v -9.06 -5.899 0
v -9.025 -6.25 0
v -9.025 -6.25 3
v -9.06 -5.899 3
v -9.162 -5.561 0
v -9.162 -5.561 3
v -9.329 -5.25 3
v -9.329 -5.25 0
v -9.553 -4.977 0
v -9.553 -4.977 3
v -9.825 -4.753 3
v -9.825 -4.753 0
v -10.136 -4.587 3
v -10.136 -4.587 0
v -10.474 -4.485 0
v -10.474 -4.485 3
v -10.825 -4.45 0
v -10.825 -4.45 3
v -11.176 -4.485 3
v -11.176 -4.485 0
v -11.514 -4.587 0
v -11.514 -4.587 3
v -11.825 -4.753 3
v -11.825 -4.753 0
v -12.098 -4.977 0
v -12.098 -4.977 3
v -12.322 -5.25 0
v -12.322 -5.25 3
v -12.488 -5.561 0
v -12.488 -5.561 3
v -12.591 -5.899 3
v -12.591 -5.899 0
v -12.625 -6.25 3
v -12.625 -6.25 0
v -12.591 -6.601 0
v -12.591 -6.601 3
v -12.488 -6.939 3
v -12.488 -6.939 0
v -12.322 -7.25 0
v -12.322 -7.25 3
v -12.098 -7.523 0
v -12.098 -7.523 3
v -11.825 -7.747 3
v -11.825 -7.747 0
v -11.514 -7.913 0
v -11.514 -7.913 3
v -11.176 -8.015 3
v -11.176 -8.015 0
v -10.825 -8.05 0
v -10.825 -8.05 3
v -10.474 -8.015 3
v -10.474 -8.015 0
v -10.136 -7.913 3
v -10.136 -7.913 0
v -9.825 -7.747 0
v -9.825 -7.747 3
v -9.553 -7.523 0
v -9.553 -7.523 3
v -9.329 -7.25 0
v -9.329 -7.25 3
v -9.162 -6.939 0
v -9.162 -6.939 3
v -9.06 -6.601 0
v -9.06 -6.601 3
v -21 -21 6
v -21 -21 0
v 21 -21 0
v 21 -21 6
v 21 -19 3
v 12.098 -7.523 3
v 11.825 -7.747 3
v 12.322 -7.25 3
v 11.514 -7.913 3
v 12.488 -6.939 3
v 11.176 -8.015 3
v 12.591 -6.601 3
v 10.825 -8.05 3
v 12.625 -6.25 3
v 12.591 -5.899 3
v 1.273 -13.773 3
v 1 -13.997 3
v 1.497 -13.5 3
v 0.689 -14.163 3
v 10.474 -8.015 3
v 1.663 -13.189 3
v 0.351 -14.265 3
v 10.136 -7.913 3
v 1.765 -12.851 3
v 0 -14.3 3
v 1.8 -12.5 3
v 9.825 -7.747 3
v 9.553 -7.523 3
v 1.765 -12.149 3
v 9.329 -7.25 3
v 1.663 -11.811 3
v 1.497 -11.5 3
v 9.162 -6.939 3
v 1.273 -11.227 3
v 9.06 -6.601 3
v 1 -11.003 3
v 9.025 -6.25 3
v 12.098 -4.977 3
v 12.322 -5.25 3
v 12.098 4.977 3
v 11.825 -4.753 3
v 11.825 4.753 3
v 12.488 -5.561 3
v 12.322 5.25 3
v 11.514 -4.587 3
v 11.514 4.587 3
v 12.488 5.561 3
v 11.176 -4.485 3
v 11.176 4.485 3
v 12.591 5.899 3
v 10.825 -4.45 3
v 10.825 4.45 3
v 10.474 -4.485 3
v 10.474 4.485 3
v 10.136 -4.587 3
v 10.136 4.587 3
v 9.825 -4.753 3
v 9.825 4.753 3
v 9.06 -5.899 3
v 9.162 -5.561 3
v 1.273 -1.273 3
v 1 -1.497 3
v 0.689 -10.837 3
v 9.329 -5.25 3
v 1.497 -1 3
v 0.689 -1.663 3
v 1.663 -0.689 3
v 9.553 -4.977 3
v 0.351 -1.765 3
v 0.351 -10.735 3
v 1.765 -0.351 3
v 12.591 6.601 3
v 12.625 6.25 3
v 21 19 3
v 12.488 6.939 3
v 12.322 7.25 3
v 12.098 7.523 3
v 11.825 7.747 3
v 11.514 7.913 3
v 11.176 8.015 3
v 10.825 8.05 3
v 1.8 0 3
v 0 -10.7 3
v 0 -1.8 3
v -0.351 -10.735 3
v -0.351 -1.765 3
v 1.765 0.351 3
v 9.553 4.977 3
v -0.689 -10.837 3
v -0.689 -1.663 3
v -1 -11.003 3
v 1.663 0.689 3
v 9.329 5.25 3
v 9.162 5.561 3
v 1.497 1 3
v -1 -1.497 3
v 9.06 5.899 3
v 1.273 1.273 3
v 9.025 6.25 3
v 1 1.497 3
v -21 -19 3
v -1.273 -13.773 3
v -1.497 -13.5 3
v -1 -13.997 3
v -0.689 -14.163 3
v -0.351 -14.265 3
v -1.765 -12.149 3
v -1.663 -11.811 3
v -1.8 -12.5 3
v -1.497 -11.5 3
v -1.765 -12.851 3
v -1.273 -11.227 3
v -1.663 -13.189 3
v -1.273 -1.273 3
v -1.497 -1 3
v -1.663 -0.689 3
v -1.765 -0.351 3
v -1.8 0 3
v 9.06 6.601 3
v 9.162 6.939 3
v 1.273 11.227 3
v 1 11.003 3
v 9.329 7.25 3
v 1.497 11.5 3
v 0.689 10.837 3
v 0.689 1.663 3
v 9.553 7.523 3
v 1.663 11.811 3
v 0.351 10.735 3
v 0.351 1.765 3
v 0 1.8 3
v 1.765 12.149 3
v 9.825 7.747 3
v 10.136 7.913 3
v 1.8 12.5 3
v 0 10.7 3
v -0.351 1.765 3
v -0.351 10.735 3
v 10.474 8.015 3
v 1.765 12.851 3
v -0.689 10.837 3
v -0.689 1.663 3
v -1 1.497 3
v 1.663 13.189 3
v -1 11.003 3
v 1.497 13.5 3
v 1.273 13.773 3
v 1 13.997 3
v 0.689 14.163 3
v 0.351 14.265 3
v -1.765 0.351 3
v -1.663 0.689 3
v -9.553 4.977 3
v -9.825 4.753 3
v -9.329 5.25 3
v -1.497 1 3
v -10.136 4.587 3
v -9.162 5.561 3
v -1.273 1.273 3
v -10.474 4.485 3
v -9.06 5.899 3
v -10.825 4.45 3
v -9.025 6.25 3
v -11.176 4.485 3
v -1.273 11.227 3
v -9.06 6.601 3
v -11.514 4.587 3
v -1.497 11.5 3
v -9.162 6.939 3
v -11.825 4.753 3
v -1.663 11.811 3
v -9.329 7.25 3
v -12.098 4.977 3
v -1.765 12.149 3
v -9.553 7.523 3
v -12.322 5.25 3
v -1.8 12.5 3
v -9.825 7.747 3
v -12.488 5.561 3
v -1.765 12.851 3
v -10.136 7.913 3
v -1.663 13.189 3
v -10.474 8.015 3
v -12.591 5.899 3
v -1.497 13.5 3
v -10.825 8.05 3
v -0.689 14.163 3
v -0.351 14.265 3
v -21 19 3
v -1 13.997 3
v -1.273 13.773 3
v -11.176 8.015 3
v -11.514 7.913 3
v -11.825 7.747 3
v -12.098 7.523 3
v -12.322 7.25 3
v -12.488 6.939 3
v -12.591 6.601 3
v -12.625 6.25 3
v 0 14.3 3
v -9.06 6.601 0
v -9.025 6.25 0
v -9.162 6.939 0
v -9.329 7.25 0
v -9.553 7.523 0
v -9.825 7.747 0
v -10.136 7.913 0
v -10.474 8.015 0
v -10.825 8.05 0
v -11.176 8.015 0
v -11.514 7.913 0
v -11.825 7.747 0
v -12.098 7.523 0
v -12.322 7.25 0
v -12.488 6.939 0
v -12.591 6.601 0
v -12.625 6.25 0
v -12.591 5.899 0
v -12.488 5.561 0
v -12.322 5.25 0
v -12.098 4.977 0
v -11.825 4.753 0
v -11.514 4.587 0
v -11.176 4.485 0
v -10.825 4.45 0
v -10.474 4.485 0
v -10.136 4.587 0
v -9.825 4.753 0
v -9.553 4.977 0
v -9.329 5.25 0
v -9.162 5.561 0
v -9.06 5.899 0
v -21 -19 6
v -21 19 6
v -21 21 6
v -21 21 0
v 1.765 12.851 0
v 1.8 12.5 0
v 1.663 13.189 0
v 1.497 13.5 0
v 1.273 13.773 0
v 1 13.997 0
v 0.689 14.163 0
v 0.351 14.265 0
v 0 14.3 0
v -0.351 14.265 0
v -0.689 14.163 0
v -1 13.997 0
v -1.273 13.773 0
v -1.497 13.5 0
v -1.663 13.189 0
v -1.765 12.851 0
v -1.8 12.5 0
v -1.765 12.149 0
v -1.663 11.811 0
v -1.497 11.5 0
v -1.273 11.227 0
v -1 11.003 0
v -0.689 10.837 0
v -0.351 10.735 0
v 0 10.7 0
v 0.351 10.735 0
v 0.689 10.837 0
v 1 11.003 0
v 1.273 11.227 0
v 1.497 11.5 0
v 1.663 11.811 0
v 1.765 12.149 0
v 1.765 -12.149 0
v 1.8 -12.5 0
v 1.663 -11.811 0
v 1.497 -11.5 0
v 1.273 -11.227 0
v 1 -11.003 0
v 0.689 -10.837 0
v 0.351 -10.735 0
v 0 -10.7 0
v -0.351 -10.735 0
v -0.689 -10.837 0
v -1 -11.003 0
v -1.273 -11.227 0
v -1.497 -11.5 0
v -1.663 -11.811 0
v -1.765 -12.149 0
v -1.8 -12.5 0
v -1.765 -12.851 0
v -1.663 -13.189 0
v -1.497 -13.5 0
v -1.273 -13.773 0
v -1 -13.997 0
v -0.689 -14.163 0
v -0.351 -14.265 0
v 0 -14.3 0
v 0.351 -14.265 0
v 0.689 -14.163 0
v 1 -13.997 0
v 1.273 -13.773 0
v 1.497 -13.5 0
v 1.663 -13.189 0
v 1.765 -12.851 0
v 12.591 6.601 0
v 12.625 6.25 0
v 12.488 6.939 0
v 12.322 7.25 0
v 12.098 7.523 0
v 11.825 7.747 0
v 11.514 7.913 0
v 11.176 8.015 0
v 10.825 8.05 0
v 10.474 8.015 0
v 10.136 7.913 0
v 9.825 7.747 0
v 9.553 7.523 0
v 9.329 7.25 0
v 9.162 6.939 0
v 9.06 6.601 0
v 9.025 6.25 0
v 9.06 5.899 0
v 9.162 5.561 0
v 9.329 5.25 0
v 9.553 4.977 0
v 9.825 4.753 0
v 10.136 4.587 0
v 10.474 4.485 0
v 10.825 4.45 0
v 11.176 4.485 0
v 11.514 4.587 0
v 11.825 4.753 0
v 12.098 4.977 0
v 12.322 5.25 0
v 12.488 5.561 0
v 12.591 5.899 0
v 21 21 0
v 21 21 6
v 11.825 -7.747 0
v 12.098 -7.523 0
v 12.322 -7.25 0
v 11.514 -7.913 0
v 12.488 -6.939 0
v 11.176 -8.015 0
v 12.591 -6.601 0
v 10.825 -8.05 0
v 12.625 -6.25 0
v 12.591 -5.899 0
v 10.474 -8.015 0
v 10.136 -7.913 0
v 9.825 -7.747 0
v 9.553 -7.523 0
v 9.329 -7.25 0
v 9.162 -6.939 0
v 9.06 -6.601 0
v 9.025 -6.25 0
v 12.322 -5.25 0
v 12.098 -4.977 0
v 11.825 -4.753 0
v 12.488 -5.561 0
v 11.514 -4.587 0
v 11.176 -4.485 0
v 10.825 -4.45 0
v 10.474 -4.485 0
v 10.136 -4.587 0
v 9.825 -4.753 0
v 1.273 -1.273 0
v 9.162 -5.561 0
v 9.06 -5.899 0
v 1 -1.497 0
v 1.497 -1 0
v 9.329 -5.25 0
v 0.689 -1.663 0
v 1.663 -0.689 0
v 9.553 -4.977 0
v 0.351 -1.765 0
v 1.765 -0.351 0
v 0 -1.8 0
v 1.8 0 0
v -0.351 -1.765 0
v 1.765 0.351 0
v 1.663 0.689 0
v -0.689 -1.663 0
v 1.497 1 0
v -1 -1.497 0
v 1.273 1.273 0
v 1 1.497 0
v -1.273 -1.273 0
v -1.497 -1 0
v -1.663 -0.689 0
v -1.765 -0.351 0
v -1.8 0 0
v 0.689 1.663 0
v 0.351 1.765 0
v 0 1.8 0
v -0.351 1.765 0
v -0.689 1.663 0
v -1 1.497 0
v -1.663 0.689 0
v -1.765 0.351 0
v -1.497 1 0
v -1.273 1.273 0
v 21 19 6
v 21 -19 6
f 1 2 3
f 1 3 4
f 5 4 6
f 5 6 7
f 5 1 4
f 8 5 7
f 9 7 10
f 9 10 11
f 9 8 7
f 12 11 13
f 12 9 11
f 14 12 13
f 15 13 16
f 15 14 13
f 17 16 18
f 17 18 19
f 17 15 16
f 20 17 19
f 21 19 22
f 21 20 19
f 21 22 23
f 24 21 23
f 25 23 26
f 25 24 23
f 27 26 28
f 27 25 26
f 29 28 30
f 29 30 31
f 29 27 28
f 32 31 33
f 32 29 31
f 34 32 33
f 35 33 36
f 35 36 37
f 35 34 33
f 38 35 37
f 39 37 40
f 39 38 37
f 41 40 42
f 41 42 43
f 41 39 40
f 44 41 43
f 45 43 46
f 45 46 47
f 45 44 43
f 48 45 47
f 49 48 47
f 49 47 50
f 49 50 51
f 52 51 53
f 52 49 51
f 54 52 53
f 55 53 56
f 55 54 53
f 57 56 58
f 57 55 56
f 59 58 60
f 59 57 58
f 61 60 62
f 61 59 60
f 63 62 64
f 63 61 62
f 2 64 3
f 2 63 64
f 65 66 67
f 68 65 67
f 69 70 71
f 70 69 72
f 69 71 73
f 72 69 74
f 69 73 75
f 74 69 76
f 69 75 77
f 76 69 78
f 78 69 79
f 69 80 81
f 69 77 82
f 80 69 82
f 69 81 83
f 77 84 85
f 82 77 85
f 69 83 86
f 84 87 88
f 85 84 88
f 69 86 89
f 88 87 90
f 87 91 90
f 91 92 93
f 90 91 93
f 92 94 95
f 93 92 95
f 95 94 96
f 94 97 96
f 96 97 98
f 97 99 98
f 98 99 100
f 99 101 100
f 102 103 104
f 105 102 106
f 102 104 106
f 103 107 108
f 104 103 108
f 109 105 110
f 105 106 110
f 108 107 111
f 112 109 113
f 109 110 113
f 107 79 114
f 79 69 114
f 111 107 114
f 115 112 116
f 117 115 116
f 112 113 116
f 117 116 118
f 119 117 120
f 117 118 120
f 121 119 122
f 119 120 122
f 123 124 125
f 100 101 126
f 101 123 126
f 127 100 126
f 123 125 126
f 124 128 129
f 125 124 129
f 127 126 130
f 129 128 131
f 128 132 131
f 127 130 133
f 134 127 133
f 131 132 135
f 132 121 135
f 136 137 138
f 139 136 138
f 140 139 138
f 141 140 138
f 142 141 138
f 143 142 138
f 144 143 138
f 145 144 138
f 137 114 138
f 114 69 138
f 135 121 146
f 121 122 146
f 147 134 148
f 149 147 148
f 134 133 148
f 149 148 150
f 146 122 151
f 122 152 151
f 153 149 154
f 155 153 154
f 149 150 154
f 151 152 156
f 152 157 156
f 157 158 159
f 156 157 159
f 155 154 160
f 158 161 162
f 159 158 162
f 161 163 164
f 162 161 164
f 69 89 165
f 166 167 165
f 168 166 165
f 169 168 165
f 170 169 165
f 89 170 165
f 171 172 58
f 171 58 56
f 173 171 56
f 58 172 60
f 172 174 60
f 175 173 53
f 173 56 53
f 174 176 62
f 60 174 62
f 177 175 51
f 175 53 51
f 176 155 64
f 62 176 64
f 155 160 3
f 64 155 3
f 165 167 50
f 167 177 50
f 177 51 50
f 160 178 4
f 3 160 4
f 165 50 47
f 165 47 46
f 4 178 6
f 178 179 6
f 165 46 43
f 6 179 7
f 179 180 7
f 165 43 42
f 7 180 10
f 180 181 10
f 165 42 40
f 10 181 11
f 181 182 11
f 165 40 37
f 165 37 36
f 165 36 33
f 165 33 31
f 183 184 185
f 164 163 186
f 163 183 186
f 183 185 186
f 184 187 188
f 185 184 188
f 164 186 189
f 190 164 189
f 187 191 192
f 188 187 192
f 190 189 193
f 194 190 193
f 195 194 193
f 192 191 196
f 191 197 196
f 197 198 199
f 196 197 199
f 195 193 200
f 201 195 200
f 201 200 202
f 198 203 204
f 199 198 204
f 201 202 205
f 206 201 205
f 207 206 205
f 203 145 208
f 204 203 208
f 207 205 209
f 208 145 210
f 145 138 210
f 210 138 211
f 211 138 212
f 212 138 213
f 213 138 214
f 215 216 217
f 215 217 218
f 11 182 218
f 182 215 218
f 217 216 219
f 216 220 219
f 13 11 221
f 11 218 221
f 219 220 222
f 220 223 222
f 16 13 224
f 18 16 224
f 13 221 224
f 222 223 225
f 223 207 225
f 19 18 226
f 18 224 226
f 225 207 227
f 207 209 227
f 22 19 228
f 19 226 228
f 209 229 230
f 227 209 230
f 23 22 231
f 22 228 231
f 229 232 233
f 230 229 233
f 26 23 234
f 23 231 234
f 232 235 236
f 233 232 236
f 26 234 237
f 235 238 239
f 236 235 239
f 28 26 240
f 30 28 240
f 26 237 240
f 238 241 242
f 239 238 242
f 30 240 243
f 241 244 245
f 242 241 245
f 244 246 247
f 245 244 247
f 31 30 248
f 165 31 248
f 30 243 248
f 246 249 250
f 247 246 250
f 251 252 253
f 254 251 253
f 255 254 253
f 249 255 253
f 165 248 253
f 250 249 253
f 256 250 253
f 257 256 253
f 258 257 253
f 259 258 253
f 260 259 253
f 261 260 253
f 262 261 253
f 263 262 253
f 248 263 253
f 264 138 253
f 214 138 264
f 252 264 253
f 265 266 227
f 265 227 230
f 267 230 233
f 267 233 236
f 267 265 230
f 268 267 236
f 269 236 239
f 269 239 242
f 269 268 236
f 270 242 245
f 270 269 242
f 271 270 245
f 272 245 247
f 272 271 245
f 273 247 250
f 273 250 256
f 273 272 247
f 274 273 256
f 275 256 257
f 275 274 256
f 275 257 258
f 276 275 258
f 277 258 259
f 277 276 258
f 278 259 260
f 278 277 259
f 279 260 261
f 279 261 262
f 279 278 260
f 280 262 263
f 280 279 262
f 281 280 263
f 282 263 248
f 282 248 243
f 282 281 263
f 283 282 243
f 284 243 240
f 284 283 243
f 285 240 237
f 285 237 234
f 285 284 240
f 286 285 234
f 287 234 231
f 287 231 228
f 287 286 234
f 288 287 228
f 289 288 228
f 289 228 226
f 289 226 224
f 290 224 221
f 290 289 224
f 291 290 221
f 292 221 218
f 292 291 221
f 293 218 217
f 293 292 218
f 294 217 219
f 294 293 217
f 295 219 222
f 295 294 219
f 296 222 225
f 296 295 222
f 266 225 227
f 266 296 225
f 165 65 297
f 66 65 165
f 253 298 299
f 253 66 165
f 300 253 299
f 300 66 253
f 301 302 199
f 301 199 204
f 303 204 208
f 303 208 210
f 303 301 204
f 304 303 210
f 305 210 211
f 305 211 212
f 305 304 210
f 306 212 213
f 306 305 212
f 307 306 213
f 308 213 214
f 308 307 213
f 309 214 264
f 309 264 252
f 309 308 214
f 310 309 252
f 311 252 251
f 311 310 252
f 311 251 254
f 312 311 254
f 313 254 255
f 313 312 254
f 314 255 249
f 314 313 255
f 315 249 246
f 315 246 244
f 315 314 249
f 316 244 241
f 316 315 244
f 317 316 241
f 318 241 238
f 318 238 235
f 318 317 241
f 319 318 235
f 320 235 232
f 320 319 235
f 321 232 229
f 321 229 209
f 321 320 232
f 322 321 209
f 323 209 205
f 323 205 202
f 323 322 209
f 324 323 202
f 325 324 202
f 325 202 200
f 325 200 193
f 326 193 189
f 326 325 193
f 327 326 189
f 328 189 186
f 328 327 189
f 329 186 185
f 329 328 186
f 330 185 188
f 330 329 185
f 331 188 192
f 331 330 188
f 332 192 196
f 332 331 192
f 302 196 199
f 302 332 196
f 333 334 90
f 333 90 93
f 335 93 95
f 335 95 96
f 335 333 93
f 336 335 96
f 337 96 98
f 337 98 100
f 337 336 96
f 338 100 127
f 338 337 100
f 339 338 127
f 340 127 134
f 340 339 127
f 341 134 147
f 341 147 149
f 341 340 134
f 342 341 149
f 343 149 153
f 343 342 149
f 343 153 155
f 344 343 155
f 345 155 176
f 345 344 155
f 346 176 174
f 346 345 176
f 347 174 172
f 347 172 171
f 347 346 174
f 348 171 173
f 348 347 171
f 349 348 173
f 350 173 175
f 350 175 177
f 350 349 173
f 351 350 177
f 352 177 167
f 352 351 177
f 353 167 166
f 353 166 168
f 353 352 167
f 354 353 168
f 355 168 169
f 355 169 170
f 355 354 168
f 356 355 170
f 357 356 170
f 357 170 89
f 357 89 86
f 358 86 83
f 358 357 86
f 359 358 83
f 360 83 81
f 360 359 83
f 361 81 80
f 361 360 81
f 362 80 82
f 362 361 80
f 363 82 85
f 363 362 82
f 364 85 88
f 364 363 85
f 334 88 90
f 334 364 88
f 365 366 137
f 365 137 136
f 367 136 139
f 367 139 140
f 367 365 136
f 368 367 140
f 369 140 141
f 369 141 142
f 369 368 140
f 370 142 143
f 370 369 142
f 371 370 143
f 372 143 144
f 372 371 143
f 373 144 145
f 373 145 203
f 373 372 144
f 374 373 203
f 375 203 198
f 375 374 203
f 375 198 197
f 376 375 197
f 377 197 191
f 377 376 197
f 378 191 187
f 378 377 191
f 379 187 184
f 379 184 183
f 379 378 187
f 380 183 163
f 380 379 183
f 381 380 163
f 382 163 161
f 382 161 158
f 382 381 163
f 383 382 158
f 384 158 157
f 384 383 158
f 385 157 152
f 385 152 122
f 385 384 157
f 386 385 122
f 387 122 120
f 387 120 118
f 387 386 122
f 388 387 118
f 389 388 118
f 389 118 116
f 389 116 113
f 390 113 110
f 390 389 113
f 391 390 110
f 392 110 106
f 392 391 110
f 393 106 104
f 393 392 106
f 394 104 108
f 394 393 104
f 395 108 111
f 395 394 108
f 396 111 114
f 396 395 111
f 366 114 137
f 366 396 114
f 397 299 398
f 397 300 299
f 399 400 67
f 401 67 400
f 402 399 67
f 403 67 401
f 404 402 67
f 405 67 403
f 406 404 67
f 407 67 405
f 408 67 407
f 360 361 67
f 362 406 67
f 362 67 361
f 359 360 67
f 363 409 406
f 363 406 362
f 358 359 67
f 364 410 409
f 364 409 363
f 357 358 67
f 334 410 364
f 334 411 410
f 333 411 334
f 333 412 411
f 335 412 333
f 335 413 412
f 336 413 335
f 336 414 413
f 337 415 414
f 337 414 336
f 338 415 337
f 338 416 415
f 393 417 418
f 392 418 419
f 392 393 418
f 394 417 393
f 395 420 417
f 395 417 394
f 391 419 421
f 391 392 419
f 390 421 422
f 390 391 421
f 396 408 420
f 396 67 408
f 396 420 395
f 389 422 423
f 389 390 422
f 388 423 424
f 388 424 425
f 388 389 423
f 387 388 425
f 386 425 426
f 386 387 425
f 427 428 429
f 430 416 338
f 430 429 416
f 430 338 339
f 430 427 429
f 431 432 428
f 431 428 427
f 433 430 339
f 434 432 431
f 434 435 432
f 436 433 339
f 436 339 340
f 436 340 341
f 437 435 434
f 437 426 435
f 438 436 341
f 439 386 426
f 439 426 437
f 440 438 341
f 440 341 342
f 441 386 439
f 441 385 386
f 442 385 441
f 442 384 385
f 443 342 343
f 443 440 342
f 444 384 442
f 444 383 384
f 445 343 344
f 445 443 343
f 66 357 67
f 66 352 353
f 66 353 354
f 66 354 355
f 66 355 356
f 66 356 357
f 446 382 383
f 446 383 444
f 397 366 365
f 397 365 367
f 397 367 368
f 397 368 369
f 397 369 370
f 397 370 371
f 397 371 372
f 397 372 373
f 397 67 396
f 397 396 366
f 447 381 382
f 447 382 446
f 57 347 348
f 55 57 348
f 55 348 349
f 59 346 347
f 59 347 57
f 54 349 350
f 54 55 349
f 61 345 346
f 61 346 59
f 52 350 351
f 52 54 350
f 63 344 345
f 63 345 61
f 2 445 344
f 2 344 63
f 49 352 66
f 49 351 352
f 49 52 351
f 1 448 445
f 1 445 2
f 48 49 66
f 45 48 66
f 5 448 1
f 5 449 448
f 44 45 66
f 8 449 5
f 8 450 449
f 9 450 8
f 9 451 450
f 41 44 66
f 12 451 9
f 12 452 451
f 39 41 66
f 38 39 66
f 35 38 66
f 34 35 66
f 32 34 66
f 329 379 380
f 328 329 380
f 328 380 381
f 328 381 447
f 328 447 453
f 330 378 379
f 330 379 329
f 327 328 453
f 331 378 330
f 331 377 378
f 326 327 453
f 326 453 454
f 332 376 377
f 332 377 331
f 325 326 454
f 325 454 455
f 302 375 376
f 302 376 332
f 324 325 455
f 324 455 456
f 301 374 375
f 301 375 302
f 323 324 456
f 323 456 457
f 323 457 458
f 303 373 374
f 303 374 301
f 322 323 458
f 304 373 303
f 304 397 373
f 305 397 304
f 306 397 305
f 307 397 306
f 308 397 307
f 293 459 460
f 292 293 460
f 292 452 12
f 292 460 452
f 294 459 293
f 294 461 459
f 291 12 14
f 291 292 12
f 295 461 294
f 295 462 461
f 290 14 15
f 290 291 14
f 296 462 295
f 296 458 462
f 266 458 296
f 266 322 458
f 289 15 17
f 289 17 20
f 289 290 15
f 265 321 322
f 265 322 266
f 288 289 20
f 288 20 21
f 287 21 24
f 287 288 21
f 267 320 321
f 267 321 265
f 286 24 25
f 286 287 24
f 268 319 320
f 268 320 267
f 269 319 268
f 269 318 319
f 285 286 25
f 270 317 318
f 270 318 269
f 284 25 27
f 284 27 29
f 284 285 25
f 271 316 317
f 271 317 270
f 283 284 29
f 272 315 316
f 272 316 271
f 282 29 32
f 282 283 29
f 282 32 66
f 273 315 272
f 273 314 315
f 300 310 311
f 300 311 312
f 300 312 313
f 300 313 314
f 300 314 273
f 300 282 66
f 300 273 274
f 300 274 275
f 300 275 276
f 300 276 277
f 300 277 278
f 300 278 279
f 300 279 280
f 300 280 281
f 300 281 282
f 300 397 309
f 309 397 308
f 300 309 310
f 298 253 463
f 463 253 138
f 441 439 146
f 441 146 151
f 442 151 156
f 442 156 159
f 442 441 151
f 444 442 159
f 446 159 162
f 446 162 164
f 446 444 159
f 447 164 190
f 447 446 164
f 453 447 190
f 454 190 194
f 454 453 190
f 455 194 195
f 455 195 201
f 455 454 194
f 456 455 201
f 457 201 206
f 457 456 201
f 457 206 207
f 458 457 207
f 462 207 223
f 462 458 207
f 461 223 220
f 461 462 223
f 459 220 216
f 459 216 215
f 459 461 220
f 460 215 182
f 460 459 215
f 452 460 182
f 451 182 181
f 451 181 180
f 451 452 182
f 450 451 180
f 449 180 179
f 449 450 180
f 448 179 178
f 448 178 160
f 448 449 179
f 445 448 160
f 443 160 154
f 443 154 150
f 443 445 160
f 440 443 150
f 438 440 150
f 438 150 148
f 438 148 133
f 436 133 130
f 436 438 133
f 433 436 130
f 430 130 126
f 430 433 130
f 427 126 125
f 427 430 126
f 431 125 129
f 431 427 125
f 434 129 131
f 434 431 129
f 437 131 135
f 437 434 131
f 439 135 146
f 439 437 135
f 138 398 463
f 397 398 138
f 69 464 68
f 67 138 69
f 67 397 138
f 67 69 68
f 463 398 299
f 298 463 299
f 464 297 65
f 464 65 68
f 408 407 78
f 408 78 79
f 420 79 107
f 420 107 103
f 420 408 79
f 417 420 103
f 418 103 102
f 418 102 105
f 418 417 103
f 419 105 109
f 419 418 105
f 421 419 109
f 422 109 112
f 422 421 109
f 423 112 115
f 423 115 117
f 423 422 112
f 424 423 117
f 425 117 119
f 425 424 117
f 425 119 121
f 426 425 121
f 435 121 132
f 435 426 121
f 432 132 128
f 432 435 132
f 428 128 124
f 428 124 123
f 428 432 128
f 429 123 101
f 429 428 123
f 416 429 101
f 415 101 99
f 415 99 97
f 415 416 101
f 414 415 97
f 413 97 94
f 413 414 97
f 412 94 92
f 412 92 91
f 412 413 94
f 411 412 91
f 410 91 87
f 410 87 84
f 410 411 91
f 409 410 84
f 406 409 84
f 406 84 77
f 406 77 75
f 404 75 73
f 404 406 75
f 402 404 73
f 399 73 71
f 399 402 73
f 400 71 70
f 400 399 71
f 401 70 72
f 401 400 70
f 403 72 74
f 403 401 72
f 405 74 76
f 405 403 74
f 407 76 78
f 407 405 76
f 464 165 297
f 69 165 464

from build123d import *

# Parameters (mm, degrees)
SKETCH_R     = 1.8
PAD_DEPTH    = 3
SKETCH001_W  = 42
SKETCH001_H  = 2
PAD001_DEPTH = 3


with BuildPart() as part:
    # Sketch → Pad (new body)
    with BuildSketch(Plane.XY):
        Polygon((-21, 21), (21, 21), (21, -21), (0, -21), (-21, -21), (-21, 0), align=None)
        with Locations((0, 12.5)):
            Circle(SKETCH_R, mode=Mode.SUBTRACT)
        with Locations((10.825318, 6.25)):
            Circle(SKETCH_R, mode=Mode.SUBTRACT)
        with Locations((10.825318, -6.25)):
            Circle(SKETCH_R, mode=Mode.SUBTRACT)
        with Locations((0, -12.5)):
            Circle(SKETCH_R, mode=Mode.SUBTRACT)
        with Locations((-10.825318, -6.25)):
            Circle(SKETCH_R, mode=Mode.SUBTRACT)
        with Locations((-10.825318, 6.25)):
            Circle(SKETCH_R, mode=Mode.SUBTRACT)
        Circle(SKETCH_R, mode=Mode.SUBTRACT)
    extrude(amount=PAD_DEPTH)

    # Sketch001 → Pad001 (new body)
    with BuildSketch(Plane.XY.offset(3)):
        Polygon((-21, 21), (21, 21), (21, 19), (0, 19), (-21, 19), align=None)
        with Locations((0, -20)):
            Rectangle(SKETCH001_W, SKETCH001_H)
    extrude(amount=PAD001_DEPTH)


solid = part.part
